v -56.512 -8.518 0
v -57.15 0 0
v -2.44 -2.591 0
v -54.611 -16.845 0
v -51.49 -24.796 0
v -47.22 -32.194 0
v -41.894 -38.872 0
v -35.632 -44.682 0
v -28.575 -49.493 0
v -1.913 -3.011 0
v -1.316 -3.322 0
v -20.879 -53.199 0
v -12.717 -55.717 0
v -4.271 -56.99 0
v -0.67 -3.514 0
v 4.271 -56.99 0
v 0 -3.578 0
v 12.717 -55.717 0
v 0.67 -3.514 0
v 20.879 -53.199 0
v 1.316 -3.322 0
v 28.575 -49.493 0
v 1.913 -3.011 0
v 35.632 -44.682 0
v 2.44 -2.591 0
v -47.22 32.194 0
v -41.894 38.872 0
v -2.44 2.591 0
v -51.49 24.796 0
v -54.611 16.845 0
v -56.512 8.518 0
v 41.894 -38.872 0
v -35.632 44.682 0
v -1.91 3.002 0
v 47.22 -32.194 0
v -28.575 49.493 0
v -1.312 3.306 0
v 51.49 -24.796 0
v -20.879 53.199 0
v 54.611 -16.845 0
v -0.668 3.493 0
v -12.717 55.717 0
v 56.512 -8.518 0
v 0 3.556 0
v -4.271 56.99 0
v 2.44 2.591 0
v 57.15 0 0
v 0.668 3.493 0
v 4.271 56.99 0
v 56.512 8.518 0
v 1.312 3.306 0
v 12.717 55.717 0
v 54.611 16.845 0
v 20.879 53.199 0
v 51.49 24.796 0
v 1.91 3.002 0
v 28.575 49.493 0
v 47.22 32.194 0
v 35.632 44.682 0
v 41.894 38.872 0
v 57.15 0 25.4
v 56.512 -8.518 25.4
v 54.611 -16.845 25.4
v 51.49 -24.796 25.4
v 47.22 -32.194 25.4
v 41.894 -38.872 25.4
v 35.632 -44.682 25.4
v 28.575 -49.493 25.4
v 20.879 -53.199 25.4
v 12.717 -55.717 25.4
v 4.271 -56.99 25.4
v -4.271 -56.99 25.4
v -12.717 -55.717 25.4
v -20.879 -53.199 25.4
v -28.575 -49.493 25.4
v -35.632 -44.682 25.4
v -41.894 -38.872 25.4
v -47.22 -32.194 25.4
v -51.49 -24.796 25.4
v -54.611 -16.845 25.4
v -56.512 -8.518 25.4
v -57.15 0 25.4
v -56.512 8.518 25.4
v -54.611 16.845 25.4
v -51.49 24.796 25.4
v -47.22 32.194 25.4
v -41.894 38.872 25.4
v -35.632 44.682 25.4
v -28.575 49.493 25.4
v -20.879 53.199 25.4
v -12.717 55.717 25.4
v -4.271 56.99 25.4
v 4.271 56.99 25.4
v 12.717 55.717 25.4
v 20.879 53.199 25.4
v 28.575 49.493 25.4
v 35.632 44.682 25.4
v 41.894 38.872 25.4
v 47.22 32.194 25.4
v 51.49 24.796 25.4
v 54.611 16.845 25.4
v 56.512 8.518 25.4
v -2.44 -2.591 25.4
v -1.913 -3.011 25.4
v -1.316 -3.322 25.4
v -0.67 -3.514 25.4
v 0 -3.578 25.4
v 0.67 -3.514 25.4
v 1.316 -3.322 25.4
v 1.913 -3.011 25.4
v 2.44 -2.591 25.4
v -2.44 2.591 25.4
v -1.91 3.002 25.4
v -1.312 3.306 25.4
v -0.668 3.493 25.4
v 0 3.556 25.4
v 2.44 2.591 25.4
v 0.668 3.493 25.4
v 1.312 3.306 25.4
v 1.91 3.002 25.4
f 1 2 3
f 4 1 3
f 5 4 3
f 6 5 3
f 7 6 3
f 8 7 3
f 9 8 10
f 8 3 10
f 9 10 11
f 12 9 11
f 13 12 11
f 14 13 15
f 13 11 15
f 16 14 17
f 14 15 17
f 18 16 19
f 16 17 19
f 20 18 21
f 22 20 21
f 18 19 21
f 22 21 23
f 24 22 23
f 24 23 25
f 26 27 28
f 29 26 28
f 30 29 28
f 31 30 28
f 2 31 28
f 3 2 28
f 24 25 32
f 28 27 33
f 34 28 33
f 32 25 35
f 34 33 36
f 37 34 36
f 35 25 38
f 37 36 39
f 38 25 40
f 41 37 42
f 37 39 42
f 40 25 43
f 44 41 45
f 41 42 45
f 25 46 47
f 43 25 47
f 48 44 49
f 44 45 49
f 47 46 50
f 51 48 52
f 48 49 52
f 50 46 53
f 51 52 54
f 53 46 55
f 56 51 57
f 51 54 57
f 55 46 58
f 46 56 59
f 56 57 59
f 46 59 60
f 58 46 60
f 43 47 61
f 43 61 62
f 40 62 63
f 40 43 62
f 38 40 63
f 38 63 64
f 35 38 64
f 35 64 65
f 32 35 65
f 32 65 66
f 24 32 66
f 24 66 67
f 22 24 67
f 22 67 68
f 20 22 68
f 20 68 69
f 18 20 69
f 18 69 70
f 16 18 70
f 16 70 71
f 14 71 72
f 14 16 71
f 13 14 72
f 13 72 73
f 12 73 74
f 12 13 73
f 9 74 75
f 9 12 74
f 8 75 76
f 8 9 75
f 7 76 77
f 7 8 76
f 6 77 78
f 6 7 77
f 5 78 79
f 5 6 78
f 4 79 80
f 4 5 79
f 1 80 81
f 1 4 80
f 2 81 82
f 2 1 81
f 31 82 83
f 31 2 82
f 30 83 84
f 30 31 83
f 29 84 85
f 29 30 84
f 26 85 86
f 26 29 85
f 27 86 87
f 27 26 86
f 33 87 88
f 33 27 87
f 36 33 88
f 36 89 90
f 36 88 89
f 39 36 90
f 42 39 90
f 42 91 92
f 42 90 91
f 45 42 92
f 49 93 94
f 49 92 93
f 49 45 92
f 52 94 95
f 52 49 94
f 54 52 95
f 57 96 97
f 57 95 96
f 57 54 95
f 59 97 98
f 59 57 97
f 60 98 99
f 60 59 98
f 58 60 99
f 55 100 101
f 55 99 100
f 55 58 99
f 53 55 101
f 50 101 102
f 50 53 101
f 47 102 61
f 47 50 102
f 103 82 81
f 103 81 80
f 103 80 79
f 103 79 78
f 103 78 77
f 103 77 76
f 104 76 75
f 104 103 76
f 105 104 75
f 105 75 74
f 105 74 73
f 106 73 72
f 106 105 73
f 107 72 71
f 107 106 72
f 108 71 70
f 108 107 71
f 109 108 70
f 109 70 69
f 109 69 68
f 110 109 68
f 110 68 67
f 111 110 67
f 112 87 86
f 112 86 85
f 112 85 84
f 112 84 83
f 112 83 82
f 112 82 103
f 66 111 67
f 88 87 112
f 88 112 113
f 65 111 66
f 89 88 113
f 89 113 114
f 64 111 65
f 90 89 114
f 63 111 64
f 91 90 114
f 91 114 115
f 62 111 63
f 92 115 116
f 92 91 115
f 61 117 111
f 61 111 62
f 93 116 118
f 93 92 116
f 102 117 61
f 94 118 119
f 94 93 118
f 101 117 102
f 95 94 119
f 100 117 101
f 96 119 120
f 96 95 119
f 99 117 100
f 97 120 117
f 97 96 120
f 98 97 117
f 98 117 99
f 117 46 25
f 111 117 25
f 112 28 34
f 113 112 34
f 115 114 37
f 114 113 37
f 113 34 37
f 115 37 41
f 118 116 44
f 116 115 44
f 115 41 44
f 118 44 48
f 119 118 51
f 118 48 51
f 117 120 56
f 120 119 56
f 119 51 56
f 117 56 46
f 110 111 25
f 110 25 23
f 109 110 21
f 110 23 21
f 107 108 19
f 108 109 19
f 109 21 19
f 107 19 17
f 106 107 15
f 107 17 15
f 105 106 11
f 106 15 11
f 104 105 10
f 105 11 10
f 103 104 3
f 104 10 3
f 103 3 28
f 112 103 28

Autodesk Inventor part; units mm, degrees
ref_plane "YZ Plane" through (0, 0, 0) normal (1, 0, 0) x (0, 1, 0)
ref_plane "XZ Plane" through (0, 0, 0) normal (0, 1, 0) x (-1, 0, 0)
ref_plane "XY Plane" through (0, 0, 0) normal (0, 0, 1) x (1, 0, 0)
sketch "Sketch1" plane through (0, 0, 0) normal (0, 0, 1) x (1, 0, 0)
  circle A0 centre (0, 0) radius 57.15
  line L0 (2.4402, 2.5908) -> (2.4402, -2.5908)
  line L1 (-2.4402, -2.5908) -> (-2.4402, 2.5908)
  line L2 (-2.4402, 2.5908) -> (2.4402, -2.5908) construction
  line L3 (2.4402, 2.5908) -> (-2.4402, -2.5908) construction
  arc A1 (2.4402, 2.5908) -> (-2.4402, 2.5908) centre (0, -0.0111) ccw
  arc A2 (-2.4402, -2.5908) -> (2.4402, -2.5908) centre (0, -0.0696) ccw
  dimension "d0" = 114.3
  dimension "d1" = 5.1816
  dimension "d2" = 4.8803
  dimension "d5" = 3.5671
extrude "Extrusion2" add sketch "Sketch1" along normal blind 25.4
properties part number "lazy susan platform"
